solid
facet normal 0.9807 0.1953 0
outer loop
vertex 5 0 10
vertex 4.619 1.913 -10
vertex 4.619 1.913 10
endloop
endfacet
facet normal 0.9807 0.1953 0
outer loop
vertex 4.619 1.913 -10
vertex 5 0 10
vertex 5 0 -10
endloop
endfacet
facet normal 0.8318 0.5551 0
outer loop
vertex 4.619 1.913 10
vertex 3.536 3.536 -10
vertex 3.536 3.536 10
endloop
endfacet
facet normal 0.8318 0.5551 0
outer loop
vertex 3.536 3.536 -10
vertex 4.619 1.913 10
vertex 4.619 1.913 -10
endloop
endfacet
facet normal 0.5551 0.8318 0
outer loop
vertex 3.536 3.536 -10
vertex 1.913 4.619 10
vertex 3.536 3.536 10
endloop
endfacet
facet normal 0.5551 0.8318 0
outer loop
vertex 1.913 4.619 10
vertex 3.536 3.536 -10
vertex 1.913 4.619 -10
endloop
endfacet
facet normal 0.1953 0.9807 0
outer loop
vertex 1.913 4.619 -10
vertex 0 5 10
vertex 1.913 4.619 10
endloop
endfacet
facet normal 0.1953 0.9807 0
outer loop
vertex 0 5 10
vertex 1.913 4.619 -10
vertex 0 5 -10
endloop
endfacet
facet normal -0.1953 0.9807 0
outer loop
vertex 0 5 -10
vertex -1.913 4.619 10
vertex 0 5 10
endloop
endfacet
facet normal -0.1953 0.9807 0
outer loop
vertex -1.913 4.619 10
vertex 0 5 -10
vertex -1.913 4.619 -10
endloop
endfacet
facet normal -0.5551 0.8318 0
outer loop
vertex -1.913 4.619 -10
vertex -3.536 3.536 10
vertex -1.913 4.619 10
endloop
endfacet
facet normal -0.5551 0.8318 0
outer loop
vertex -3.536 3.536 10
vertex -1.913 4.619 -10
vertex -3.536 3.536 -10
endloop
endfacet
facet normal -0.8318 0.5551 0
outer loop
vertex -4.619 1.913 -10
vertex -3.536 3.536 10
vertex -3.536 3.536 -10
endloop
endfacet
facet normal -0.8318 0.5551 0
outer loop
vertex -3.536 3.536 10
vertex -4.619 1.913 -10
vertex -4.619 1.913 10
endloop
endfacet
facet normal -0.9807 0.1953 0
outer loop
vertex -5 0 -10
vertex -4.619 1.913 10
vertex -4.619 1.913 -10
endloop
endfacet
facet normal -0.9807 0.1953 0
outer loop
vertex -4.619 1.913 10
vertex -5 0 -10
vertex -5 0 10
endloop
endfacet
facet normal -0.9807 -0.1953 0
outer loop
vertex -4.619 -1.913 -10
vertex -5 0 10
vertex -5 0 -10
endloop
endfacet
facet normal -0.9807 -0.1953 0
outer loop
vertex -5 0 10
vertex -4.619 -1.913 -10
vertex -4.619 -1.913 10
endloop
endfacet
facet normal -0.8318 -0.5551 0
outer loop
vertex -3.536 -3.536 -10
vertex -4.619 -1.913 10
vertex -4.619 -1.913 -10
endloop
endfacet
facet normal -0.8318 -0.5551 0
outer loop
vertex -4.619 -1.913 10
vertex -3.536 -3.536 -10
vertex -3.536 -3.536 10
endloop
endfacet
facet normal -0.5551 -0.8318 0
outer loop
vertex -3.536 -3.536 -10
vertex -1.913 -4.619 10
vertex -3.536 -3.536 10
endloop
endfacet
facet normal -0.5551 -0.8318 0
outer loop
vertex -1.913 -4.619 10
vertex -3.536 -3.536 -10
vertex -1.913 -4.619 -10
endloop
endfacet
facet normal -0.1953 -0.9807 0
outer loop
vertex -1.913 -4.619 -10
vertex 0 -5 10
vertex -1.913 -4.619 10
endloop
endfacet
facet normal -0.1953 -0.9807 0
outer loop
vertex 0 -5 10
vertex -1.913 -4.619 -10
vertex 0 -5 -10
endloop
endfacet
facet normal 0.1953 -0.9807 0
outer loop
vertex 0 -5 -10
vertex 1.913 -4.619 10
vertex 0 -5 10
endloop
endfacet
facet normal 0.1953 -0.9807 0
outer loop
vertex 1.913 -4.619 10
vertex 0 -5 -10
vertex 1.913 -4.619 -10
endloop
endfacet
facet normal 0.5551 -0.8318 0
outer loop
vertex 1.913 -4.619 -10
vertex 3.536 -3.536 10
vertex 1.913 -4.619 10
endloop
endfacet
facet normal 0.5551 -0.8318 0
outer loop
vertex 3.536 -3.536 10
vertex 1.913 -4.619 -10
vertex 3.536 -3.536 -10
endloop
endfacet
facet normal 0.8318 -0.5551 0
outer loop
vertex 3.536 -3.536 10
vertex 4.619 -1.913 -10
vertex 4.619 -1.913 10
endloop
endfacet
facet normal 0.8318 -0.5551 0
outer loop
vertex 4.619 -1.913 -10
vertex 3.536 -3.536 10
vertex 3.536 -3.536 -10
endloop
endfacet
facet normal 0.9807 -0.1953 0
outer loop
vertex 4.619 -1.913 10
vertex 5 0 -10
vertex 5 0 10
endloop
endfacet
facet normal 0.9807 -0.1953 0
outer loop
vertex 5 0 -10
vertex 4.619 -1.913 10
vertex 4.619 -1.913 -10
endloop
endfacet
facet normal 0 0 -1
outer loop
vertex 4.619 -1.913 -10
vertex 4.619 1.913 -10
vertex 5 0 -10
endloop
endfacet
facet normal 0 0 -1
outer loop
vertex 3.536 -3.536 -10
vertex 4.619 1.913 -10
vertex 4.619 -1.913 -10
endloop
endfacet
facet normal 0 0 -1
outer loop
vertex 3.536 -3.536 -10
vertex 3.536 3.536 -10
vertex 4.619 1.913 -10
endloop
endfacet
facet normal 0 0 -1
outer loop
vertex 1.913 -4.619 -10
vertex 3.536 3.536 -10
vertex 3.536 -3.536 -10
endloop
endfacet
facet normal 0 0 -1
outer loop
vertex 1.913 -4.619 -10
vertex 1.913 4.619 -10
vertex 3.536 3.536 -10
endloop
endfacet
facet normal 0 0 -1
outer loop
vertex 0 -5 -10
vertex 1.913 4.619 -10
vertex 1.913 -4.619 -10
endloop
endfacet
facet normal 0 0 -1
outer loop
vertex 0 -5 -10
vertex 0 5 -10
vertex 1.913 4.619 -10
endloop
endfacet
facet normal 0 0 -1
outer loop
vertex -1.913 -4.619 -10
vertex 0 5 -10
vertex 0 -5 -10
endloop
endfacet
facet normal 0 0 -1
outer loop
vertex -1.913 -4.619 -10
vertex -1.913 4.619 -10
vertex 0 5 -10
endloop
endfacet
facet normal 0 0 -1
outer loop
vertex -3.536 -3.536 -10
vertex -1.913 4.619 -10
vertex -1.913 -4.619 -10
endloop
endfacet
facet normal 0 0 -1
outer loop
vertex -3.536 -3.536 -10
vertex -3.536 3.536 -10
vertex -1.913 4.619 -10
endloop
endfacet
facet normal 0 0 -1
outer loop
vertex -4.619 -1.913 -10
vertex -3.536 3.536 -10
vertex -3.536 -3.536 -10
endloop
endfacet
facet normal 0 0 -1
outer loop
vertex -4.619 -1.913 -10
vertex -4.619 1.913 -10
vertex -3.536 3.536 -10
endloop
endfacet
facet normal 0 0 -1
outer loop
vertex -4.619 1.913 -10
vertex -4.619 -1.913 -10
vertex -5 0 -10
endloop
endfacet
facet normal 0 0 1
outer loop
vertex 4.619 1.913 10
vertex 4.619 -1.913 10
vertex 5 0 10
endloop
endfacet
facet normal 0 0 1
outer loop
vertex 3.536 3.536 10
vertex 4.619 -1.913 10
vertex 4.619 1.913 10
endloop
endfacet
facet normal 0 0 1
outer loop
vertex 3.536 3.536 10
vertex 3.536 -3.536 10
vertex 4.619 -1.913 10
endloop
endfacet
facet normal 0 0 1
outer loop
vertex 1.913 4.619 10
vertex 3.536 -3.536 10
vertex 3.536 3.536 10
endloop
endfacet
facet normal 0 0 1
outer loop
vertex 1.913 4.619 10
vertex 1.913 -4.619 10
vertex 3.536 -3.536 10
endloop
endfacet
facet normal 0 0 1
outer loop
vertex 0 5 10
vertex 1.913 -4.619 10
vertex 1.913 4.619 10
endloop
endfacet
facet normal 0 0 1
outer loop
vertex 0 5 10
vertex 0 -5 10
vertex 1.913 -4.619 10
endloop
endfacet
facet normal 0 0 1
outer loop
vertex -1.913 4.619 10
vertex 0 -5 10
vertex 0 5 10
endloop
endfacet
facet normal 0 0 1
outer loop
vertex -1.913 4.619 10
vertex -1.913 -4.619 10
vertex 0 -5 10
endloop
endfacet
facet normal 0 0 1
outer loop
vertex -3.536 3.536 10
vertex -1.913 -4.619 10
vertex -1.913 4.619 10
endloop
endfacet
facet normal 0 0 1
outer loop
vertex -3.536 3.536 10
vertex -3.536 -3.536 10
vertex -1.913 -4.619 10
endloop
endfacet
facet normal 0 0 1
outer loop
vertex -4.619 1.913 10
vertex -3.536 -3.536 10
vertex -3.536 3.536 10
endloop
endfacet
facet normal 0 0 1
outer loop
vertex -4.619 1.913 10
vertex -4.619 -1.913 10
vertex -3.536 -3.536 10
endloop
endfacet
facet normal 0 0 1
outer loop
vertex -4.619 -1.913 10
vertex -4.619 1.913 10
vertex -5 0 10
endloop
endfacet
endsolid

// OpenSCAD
// Generated by SolidPython 0.4.6 on 2020-01-18 00:33:32


cylinder(center = true, d = 10, h = 20);
/***********************************************
*********      SolidPython code:      **********
************************************************
 
# Generic Part Class

# Import SolidPython
from solid import *

# This class acts more as a specification and generator for the geometry than as a representation of the actual objects.
# Each part needs to be self-contained and run without information from the other parts (directly)
# This will allow more flexibility in design as we can change each part individually without affecting the others
class RSGL_Part:
    
    # Needs to be overrided by other classes to be used
    # Create a new instance of this object and return it to the user
    def generate_geometry(self):
        print('Generating Part Geometry')
        return None
    
    def render_to_file(self, path):
        
        if not path.endswith('.scad'):
            raise ValueError('File is not an OpenSCAD file')
            return None
        
        g = self.generate_geometry()
        print('Rendering to %s' % path)
        
        try:
            scad_render_to_file(g, path)
        except Exception as e:
            print(e)
            return None
        
        return g
    
    def render_to_stl(self, path):
        self.render_to_file(path + 'scad')
        raise NotImplementedError('Rendering to STL file has not been implemented yet.')
        print('Rendering to %s' % path)
 
 
************************************************/
